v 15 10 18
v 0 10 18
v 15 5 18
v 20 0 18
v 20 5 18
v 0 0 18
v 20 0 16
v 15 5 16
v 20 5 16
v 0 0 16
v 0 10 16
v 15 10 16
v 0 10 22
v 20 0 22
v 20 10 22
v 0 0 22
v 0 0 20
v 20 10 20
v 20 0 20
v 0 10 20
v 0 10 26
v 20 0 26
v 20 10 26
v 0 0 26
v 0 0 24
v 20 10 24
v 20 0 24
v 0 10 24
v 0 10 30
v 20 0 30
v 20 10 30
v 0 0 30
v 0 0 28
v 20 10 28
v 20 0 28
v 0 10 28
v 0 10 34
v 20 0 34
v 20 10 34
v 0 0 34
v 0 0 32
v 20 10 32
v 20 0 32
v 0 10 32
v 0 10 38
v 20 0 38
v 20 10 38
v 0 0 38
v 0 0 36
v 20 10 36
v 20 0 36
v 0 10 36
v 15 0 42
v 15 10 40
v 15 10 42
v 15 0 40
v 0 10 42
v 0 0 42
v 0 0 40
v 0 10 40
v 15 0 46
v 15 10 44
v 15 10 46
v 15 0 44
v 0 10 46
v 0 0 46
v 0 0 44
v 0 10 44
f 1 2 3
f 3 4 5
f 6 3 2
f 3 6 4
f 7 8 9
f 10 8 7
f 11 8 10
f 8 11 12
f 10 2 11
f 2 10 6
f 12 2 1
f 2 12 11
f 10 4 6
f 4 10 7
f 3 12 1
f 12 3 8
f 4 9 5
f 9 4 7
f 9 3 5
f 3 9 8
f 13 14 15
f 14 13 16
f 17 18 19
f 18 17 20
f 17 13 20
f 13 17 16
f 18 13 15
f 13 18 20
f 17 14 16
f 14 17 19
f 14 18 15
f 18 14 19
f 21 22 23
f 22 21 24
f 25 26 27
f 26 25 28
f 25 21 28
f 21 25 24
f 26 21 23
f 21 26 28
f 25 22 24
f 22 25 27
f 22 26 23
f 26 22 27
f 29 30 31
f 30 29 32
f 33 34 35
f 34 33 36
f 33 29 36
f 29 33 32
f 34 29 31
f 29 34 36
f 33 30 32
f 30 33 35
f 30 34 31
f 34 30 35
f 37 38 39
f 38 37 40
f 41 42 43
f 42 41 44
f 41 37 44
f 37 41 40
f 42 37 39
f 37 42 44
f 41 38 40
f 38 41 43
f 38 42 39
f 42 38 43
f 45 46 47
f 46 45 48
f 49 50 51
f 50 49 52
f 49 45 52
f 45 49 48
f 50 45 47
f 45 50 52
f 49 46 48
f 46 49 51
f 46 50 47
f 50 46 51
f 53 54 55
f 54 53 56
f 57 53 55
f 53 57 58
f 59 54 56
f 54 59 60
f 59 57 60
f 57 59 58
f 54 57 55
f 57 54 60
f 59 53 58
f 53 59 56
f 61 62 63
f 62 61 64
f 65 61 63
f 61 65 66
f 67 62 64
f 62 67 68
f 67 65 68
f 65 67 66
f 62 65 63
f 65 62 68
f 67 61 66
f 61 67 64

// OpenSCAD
// colors
k = [0.312,0.316,0.367];
c = [0.1,0.5,0.814];
m = [0.85,0.306,0.347];
y = [0.865,0.678,0.11];
g = [0.392,0.941,0.372];

h = 2; // layer height 
gap = 2;

/*
// L0
color(k) translate([0,0,0]) cube([5,10,h],center=false);
color(c) translate([5,0,0]) cube([10,5,h],center=false);
color(m) translate([5,5,0]) cube([10,5,h],center=false);
color(y) translate([15,0,0]) cube([5,5,h],center=false);


// L1
color(k) translate([0,0,h+gap]) cube([5,10,h],center=false);
color(c) translate([5,0,h+gap]) cube([10,5,h],center=false);
color(m) translate([5,5,h+gap]) cube([10,5,h],center=false);
color(y) translate([15,0,h+gap]) cube([5,5,h],center=false);


// L2
color(k) translate([0,0,(h+gap)*2]) cube([3,10,h],center=false);
color(c) translate([3,0,(h+gap)*2]) cube([12,7,h],center=false);
color(m) translate([3,7,(h+gap)*2]) cube([12,3,h],center=false);
color(y) translate([15,0,(h+gap)*2]) cube([5,5,h],center=false);


// L3
color(k) translate([0,0,(h+gap)*3]) cube([3,10,h],center=false);
color(c) translate([3,0,(h+gap)*3]) cube([12,10,h],center=false);
color(y) translate([15,0,(h+gap)*3]) cube([5,5,h],center=false);
*/

// L4
color(k) translate([0,0,(h+gap)*4]) cube([10,10,h],center=false);
color(c) translate([10,0,(h+gap)*4]) cube([5,10,h],center=false);
color(y) translate([15,0,(h+gap)*4]) cube([5,5,h],center=false);


// L5
color(k) translate([0,0,(h+gap)*5]) cube([13,10,h],center=false);
color(g) translate([15,5,(h+gap)*5]) cube([5,5,h],center=false);
color(y) translate([15,0,(h+gap)*5]) cube([5,5,h],center=false);
color(m) translate([13,0,(h+gap)*5]) cube([2,10,h],center=false);


// L6
color(k) translate([0,0,(h+gap)*6]) cube([11,10,h],center=false);
color(g) translate([15,5,(h+gap)*6]) cube([5,5,h],center=false);
color(y) translate([15,0,(h+gap)*6]) cube([5,5,h],center=false);
color(m) translate([13,0,(h+gap)*6]) cube([2,10,h],center=false);
color(c) translate([11,0,(h+gap)*6]) cube([2,10,h],center=false);


// L7
color(k) translate([0,0,(h+gap)*7]) cube([11,10,h],center=false);
color(g) translate([15,5,(h+gap)*7]) cube([5,5,h],center=false);
color(g) translate([13,0,(h+gap)*7]) cube([2,10,h],center=false);
color(y) translate([15,0,(h+gap)*7]) cube([5,5,h],center=false);
color(c) translate([11,0,(h+gap)*7]) cube([2,10,h],center=false);


// L8
color(k) translate([0,0,(h+gap)*8]) cube([3,10,h],center=false);
color(g) translate([8,0,(h+gap)*8]) cube([12,10,h],center=false);
color(c) translate([3,0,(h+gap)*8]) cube([5,10,h],center=false);


// L9
color(k) translate([0,0,(h+gap)*9]) cube([5,10,h],center=false);
color(g) translate([5,0,(h+gap)*9]) cube([15,10,h],center=false);


// L10
color(g) translate([0,0,(h+gap)*10]) cube([15,10,h],center=false);


// L11
color(g) translate([0,0,(h+gap)*11]) cube([15,10,h],center=false);
